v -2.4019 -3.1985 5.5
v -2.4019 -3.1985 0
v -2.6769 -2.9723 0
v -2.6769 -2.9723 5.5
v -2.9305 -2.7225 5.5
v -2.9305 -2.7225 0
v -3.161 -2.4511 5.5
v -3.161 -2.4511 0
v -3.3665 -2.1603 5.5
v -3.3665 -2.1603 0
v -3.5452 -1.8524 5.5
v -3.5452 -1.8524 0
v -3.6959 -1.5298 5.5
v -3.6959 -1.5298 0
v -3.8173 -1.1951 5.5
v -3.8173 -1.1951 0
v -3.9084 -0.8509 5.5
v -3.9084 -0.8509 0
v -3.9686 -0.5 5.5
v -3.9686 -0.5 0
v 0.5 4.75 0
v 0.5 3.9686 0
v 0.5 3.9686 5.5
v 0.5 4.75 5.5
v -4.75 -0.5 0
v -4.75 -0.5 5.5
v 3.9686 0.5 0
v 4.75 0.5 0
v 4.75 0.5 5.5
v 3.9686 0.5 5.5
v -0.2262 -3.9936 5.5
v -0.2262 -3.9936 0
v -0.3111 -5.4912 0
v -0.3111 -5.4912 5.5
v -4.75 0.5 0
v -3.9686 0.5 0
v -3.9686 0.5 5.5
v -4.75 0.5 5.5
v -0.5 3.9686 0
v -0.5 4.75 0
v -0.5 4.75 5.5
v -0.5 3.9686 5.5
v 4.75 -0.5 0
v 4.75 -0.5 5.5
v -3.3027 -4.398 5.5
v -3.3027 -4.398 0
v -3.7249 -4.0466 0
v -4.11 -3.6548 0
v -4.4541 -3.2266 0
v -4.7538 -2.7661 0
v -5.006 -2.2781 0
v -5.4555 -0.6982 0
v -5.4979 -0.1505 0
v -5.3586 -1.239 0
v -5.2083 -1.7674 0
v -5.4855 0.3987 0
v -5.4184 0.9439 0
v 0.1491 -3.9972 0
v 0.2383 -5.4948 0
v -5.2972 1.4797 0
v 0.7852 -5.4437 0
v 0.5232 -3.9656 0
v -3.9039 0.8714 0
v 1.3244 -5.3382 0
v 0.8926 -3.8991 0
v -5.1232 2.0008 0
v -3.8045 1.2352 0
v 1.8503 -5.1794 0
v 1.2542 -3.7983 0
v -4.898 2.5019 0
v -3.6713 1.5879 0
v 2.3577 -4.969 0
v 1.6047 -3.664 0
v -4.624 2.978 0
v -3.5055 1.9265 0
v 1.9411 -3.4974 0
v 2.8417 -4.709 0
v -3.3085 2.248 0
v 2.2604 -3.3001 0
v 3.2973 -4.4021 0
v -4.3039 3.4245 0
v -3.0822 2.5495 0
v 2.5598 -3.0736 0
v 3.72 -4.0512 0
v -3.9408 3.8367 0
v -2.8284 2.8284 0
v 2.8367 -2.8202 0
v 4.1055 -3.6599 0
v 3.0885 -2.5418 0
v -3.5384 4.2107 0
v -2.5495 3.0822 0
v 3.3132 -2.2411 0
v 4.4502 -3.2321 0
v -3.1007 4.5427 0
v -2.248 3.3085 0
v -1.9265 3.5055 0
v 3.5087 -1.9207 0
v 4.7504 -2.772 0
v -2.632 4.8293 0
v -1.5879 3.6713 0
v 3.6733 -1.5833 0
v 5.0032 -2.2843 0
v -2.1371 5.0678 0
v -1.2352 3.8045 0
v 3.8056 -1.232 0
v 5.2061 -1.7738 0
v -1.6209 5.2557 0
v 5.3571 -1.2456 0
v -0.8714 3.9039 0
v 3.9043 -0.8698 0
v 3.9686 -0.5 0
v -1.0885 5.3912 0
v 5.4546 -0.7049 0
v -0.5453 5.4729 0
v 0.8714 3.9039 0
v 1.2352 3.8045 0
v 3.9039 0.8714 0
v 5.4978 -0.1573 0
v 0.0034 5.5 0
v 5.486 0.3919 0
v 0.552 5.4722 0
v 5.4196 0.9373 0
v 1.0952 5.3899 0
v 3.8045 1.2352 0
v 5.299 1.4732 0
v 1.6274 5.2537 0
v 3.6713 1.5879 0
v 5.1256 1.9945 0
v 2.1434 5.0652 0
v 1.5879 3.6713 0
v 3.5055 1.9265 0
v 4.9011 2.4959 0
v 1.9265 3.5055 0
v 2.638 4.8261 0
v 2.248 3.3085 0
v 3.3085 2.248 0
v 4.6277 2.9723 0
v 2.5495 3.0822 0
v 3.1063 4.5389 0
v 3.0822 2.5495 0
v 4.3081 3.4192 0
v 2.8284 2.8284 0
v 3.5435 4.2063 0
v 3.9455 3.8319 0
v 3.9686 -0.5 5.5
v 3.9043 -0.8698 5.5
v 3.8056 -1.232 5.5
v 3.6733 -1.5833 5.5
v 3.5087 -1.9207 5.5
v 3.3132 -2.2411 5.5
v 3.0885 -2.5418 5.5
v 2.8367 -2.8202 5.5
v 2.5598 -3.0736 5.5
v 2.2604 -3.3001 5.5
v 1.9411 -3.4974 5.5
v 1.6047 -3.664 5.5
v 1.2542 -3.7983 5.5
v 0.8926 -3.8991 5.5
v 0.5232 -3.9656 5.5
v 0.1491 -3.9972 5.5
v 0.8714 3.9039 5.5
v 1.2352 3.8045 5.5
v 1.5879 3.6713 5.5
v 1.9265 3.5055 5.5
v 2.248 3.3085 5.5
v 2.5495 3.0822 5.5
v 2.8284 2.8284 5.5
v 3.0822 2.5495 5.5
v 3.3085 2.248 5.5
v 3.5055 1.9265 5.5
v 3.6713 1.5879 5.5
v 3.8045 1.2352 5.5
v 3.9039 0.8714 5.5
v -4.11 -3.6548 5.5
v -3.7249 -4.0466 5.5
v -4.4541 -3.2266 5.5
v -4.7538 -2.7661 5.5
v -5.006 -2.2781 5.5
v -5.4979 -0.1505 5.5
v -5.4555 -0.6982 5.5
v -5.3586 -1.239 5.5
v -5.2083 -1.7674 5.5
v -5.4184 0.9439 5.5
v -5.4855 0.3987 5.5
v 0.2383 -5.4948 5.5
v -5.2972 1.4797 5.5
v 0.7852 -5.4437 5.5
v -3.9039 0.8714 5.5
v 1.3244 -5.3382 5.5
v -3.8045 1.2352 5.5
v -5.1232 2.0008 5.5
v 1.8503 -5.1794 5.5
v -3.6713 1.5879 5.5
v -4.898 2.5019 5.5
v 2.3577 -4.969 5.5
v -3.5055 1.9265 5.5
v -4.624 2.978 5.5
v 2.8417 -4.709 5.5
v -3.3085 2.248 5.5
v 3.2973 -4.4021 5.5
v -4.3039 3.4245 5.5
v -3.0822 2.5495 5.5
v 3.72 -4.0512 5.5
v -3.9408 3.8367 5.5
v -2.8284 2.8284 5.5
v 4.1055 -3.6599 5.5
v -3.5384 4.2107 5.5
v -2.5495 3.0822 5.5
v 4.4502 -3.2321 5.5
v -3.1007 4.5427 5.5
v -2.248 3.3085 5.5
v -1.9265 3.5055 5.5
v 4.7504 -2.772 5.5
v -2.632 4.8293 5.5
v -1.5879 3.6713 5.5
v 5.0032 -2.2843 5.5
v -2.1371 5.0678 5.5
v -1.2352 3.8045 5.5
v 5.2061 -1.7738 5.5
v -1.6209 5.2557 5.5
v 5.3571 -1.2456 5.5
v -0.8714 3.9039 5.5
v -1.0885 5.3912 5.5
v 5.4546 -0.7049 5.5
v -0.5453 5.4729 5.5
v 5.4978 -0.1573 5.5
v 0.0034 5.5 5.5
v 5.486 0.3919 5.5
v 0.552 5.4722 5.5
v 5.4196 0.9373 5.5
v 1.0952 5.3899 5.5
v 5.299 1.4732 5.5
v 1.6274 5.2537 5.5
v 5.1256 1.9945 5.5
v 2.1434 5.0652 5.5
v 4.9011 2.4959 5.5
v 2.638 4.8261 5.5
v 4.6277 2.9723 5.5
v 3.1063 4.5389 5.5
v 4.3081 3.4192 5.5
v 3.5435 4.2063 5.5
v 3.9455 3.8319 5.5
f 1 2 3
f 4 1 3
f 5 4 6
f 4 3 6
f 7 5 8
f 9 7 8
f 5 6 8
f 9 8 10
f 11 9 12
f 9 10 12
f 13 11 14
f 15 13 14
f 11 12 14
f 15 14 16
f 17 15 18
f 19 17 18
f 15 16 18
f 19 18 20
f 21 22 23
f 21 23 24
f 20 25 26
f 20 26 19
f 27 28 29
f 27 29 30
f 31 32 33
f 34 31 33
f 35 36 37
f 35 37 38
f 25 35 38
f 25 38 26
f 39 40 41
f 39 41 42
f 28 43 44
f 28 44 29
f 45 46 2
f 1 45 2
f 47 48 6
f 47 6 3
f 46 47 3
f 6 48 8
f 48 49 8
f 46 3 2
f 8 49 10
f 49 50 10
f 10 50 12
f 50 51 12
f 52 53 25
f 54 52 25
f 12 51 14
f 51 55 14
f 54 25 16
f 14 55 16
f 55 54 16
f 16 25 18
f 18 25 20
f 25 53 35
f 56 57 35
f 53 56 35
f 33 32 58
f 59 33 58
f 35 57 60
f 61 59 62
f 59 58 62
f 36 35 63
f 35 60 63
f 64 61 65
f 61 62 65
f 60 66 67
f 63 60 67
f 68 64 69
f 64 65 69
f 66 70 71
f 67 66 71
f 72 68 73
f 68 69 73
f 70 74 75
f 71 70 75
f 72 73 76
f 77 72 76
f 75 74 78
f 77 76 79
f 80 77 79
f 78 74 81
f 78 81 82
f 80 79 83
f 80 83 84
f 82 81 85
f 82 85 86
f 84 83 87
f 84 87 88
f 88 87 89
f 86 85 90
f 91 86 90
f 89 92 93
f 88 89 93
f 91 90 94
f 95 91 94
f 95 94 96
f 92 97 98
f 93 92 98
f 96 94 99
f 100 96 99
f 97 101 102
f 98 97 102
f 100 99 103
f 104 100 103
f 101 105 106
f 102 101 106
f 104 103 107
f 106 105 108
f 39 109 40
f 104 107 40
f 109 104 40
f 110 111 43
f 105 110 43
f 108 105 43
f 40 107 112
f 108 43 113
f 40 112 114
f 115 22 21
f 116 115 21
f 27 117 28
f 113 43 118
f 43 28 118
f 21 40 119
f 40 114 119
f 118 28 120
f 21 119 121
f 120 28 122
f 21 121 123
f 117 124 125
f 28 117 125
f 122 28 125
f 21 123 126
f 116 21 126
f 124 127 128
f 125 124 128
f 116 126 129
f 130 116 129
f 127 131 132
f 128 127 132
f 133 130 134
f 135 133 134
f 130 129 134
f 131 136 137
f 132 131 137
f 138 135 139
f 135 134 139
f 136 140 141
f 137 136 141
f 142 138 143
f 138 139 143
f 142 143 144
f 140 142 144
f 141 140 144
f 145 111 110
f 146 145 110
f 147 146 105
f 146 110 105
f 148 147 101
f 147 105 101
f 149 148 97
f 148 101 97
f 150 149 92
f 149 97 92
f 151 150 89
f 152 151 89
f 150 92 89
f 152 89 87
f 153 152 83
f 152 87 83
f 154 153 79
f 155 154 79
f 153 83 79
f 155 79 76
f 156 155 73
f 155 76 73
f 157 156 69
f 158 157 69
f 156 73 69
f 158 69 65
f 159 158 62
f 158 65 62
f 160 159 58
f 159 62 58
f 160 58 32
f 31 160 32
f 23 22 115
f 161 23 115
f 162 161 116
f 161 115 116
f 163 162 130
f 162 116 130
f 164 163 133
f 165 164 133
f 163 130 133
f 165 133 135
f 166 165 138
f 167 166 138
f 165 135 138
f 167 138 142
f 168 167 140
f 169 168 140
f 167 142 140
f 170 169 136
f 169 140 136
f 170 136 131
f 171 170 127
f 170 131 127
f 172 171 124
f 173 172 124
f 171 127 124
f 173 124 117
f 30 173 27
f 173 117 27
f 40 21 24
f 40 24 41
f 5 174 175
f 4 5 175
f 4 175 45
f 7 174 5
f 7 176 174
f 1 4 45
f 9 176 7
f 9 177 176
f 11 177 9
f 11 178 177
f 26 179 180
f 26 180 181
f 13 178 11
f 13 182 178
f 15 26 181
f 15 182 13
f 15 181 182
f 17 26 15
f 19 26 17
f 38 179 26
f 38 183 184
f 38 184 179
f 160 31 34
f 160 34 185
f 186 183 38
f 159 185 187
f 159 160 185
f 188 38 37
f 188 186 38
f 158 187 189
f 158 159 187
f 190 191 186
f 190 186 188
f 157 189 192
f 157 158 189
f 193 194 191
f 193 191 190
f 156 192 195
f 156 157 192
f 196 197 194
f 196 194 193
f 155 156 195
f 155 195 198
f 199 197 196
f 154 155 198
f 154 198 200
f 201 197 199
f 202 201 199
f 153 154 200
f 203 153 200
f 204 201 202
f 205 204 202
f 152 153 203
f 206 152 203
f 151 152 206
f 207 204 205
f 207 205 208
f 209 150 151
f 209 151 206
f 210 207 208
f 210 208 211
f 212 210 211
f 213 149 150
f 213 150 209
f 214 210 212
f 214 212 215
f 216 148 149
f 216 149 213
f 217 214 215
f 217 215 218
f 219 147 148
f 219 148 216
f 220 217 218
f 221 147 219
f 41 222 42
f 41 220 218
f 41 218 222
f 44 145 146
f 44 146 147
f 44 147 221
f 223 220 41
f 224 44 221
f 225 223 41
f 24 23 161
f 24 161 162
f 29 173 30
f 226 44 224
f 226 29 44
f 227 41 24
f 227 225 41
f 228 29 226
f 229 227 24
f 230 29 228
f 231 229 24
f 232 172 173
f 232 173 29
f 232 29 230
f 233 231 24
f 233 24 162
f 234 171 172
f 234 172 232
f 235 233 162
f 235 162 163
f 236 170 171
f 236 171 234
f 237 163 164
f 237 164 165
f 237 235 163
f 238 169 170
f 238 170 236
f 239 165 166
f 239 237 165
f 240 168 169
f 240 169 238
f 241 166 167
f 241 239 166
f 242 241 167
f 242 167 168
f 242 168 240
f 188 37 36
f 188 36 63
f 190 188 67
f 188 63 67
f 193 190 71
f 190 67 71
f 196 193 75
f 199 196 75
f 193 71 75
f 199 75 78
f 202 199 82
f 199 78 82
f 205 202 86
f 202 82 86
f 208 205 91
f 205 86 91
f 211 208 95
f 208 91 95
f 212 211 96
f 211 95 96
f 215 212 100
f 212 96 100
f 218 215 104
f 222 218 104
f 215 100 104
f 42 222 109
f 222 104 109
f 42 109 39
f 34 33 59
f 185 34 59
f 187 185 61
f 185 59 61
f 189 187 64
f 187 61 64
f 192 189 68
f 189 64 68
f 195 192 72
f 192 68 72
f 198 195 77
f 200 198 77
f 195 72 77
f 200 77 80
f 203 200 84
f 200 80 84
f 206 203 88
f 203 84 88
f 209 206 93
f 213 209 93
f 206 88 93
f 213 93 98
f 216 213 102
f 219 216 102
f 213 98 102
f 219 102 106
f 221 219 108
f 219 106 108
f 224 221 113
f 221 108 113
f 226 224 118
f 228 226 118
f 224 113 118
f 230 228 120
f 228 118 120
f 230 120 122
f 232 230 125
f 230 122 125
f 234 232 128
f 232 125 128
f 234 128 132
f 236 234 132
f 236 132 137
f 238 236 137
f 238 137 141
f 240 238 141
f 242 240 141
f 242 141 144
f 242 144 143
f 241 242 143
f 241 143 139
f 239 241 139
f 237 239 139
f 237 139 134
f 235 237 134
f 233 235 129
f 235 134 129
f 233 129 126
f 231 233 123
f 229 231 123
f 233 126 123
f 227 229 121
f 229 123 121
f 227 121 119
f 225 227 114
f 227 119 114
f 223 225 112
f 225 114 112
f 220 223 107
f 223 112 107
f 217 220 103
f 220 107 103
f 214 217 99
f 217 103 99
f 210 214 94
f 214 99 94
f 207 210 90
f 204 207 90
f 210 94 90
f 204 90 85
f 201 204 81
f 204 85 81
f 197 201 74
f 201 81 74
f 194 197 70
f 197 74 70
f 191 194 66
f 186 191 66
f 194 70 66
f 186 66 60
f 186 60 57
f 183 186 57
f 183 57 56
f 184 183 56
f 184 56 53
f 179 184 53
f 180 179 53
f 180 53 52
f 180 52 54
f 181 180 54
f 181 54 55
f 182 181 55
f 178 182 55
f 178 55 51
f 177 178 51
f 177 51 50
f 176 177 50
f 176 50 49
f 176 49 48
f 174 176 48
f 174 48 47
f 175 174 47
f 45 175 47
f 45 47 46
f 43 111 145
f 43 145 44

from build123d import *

# Parameters (mm, degrees)
BOSS_EXTRUDE1_DEPTH = 5.5
CUT_EXTRUDE1_START  = -5.5
CUT_EXTRUDE1_DEPTH  = 5.5


with BuildPart() as part:
    # Sketch1 → Boss-Extrude1 (new body)
    with BuildSketch(Plane.XY):
        with BuildLine():
            Line((-0.226235298, -3.993597074), (-0.311073535, -5.491195977))
            ThreePointArc((-0.311073535, -5.491195977), (1.887741114, 5.165891355), (-3.302674289, -4.397993013))
            Line((-3.302674289, -4.397993013), (-2.401944937, -3.198540373))
            ThreePointArc((-2.401944937, -3.198540373), (1.372902628, 3.757011894), (-0.226235298, -3.993597074))
        make_face()
    extrude(amount=BOSS_EXTRUDE1_DEPTH)

    # Sketch2 → Cut-Extrude1 (cut)
    with BuildSketch(Plane.XY.offset(5.5).offset(CUT_EXTRUDE1_START)):
        with BuildLine():
            Line((-0.5, 4.75), (-0.5, 3.968626967))
            ThreePointArc((-0.5, 3.968626967), (0, 4), (0.5, 3.968626967))
            Line((0.5, 3.968626967), (0.5, 4.75))
            Line((0.5, 4.75), (-0.5, 4.75))
        make_face()
        with BuildLine():
            Line((-3.968626967, 0.5), (-4.75, 0.5))
            Line((-4.75, 0.5), (-4.75, -0.5))
            Line((-4.75, -0.5), (-3.968626967, -0.5))
            ThreePointArc((-3.968626967, -0.5), (-4, 0), (-3.968626967, 0.5))
        make_face()
        with BuildLine():
            Line((4.75, 0.5), (3.968626967, 0.5))
            ThreePointArc((3.968626967, 0.5), (4, 0), (3.968626967, -0.5))
            Line((3.968626967, -0.5), (4.75, -0.5))
            Line((4.75, -0.5), (4.75, 0.5))
        make_face()
    extrude(amount=CUT_EXTRUDE1_DEPTH, mode=Mode.SUBTRACT)


solid = part.part
